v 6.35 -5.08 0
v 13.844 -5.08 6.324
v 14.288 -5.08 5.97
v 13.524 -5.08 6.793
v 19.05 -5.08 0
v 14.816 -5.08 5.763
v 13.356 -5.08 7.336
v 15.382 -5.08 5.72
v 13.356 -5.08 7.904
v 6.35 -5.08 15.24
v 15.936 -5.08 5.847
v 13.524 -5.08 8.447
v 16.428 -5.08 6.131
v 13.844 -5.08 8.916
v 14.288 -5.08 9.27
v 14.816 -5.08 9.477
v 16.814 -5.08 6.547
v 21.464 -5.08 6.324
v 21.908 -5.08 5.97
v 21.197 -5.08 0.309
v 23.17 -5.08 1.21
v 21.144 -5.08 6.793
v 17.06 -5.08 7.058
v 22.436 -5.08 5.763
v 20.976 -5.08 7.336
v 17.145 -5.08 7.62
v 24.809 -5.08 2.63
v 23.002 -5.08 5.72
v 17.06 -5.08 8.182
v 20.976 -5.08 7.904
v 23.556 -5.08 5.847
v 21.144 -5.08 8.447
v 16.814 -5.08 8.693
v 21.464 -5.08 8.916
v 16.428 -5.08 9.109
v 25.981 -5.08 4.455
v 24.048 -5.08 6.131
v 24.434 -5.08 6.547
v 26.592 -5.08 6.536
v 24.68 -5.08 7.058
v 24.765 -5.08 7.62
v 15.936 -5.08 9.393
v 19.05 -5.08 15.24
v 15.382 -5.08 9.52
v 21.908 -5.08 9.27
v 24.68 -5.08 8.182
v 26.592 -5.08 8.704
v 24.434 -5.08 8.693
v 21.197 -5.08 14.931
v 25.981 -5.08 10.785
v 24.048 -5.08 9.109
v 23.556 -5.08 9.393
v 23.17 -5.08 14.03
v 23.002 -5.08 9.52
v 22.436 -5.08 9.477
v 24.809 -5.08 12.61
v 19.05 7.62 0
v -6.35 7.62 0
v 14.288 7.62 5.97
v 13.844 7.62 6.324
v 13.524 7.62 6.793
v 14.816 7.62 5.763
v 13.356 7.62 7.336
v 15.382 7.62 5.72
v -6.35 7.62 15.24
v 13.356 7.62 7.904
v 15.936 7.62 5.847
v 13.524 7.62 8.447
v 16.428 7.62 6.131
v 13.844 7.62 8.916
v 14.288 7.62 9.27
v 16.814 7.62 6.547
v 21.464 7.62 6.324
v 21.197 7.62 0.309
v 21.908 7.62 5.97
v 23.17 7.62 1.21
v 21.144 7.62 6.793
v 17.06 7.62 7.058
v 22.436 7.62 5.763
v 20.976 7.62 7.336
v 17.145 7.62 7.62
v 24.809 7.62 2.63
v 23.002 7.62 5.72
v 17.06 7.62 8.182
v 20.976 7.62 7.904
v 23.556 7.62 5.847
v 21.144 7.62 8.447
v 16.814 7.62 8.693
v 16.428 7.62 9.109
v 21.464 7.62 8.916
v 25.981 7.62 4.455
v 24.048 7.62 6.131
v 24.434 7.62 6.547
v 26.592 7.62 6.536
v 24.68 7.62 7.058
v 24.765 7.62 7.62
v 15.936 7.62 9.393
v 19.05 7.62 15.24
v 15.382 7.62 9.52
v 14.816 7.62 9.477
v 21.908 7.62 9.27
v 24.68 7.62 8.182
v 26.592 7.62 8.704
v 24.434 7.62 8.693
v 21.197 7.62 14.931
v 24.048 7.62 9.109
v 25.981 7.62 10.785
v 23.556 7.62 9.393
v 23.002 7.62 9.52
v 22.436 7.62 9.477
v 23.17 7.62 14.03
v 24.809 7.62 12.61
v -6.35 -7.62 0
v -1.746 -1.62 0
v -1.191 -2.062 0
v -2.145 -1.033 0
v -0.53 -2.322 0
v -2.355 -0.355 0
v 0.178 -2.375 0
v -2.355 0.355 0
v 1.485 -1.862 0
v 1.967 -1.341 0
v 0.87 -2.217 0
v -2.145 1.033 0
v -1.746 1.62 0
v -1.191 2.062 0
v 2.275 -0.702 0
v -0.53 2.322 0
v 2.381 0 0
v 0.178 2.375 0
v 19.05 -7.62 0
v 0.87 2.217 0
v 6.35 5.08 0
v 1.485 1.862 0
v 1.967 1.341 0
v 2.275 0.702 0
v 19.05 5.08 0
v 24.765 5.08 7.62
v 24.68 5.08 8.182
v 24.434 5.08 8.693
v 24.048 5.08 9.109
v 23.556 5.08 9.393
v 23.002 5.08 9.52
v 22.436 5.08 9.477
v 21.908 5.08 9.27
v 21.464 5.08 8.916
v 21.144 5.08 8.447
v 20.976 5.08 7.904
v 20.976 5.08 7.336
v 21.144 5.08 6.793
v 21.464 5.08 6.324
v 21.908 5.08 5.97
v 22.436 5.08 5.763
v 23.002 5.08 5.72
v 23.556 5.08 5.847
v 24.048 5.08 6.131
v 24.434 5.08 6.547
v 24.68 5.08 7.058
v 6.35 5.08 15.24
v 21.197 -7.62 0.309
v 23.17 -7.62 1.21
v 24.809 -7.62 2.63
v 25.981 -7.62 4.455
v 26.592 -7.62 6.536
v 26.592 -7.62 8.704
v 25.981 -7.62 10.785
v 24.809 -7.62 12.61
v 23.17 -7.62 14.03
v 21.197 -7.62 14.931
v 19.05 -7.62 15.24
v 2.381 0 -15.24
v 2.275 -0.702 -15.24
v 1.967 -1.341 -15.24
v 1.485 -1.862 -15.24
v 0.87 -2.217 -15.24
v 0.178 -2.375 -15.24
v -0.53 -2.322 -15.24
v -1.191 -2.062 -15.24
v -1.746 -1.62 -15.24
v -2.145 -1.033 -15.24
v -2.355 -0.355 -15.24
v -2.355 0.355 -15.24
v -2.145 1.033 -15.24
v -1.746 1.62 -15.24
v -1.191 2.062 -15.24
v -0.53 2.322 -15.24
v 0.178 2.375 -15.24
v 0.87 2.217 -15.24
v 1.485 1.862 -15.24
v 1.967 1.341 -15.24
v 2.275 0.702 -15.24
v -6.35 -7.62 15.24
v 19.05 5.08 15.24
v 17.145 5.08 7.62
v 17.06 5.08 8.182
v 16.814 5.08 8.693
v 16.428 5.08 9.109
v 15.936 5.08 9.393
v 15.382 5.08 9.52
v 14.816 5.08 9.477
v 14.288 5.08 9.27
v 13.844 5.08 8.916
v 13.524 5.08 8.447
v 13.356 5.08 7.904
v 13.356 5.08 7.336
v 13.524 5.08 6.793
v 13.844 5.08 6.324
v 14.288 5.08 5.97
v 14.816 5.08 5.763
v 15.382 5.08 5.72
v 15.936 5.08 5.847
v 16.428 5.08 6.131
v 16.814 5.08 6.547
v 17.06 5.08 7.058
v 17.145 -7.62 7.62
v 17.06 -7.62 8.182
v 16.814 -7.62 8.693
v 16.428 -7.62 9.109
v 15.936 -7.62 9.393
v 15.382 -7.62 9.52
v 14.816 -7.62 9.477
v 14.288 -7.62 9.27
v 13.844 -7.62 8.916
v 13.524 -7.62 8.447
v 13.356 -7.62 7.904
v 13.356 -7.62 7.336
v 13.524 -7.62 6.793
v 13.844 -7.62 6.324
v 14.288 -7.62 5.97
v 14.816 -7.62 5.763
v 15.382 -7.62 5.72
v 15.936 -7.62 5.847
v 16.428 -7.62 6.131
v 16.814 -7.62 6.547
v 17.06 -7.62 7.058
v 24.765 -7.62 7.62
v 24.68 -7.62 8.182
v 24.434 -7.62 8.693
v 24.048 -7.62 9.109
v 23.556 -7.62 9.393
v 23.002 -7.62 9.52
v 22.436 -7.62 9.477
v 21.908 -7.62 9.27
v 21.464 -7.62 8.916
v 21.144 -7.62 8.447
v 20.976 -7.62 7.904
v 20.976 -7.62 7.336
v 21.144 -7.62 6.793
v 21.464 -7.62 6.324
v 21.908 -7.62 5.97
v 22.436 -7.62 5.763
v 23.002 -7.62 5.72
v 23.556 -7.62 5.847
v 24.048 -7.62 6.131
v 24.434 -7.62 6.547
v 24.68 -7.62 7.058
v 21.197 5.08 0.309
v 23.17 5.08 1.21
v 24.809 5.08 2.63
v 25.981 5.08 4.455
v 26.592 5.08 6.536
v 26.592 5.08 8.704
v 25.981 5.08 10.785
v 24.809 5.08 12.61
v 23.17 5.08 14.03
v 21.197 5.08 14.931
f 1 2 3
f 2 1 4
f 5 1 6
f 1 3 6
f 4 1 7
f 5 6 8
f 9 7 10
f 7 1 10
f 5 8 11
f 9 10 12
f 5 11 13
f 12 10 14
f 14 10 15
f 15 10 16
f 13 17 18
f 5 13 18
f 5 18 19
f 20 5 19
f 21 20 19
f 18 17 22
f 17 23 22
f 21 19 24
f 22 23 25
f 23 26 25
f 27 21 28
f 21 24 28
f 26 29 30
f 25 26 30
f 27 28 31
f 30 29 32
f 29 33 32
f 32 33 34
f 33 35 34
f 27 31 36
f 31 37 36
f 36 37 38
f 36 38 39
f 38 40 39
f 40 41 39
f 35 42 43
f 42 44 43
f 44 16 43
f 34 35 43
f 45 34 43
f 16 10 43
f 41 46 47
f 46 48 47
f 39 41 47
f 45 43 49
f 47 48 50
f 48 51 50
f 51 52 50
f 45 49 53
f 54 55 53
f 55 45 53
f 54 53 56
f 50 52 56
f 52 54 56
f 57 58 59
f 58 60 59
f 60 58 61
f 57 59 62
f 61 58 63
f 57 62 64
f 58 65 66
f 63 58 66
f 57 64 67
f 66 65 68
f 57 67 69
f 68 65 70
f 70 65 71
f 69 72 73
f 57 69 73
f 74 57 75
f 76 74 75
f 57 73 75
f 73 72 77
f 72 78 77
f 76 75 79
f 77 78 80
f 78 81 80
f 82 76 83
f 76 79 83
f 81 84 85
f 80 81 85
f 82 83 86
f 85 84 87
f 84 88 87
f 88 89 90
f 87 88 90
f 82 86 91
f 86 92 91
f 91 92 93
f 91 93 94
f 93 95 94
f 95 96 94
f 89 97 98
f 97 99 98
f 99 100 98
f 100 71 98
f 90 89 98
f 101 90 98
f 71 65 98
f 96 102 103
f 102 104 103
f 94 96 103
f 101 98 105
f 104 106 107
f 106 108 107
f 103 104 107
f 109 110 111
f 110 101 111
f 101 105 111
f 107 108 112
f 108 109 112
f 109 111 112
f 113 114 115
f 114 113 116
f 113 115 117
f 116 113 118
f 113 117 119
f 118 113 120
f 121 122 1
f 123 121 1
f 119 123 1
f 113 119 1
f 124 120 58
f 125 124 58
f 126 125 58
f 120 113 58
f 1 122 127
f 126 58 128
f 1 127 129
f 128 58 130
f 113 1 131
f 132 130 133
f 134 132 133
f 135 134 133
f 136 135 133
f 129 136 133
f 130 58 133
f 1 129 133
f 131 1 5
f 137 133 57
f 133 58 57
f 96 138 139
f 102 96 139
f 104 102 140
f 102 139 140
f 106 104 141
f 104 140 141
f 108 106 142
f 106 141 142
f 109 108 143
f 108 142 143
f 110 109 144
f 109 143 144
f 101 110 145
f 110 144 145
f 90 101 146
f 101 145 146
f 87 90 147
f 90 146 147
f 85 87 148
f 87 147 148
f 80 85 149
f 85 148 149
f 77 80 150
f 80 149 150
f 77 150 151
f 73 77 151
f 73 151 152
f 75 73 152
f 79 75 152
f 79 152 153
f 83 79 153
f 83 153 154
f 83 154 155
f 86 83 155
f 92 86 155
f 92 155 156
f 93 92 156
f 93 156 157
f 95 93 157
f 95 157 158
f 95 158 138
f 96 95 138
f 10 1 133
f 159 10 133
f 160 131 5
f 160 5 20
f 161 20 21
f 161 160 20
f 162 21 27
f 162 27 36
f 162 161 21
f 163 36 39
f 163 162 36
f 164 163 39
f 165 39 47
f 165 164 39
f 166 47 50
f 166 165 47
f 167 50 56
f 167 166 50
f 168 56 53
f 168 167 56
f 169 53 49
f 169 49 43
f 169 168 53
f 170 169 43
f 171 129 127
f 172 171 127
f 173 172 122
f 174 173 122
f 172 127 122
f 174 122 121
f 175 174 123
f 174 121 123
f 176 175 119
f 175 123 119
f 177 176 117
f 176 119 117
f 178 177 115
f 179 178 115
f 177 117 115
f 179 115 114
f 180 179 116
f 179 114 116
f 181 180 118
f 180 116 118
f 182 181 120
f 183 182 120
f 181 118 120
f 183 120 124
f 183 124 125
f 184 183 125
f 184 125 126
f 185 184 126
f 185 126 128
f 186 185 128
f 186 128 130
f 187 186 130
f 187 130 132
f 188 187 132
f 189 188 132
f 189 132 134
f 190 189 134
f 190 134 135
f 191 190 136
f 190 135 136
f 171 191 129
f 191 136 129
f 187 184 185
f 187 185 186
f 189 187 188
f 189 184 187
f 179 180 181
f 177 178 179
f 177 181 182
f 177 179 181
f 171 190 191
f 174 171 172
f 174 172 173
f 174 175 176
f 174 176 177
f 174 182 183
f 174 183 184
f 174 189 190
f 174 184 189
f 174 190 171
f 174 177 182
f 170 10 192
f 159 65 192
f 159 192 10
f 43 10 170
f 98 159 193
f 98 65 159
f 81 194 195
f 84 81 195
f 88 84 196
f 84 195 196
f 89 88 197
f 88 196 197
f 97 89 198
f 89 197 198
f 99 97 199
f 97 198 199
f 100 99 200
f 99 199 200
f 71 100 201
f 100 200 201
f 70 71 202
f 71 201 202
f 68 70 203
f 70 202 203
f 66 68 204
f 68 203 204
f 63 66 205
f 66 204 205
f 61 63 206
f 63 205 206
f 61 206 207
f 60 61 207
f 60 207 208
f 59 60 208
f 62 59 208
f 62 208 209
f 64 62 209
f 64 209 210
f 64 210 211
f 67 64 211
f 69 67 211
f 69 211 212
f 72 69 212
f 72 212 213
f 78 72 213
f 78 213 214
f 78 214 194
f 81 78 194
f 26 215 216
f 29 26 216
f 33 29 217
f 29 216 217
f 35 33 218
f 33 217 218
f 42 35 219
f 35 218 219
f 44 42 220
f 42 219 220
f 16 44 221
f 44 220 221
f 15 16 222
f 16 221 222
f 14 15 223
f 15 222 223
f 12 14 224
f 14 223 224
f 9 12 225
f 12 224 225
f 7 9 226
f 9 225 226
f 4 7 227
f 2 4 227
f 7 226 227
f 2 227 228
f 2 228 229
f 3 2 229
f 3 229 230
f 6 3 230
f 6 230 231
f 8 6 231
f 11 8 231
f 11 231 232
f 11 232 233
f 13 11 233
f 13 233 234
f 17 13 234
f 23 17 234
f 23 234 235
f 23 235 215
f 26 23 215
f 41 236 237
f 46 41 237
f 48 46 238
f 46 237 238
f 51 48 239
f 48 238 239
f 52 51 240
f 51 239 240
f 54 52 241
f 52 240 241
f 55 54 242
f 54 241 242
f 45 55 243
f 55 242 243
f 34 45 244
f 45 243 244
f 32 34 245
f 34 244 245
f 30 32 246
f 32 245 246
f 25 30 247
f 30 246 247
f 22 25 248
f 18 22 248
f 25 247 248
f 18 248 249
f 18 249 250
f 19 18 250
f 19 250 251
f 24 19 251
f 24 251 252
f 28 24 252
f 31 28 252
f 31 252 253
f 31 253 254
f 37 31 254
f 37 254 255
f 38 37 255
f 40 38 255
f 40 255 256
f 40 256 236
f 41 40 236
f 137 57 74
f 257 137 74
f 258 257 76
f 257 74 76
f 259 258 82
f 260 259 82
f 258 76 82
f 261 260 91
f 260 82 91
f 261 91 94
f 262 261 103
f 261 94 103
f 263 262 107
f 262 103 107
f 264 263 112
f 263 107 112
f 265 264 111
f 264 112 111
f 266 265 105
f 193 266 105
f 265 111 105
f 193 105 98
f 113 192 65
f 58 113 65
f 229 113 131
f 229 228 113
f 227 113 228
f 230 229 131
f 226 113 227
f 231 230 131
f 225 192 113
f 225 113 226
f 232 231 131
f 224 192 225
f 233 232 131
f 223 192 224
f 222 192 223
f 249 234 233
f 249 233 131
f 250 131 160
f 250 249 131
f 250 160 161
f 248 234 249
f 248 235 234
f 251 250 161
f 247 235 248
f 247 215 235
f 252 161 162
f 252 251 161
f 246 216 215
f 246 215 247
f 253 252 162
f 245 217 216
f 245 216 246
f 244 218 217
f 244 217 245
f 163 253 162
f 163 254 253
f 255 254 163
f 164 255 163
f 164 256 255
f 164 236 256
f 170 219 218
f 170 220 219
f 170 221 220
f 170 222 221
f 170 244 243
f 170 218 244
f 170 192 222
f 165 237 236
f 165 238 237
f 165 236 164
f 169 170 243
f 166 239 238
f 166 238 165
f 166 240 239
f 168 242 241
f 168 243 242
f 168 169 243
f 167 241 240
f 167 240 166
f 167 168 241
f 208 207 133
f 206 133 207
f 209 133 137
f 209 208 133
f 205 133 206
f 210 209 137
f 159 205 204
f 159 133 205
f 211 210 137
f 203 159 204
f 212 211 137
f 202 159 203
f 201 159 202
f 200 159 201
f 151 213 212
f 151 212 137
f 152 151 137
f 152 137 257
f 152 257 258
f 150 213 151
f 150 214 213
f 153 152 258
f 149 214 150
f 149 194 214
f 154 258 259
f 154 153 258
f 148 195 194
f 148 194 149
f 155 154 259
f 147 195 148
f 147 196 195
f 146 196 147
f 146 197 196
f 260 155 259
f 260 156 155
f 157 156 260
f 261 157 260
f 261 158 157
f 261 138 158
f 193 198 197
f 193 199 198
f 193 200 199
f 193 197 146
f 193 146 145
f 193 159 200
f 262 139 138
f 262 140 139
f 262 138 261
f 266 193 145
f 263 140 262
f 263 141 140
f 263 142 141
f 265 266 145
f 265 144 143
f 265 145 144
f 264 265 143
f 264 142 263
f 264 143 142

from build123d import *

# Parameters (mm, degrees)
F0_W     = 12.7
F0_H     = 15.24
F1_DEPTH = 15.24
F2_R     = 2.38125
F3_DEPTH = 15.24
F4_W     = 12.7
F4_H     = 15.24
F5_DEPTH = 2.54
F7_R     = 1.905
F8_DEPTH = 15.241


with BuildPart() as f1:
    # F0 (on Top) → F1 (new body)
    with BuildSketch(Plane.XY):
        Rectangle(F0_W, F0_H)
    extrude(amount=F1_DEPTH)

    # F2 (on face) → F3 (join)
    with BuildSketch(Plane(origin=(0, 0, 0), x_dir=(1, 0, 0), z_dir=(0, 0, -1))):
        Circle(F2_R)
    extrude(amount=F3_DEPTH)

    # F4 (on face) → F5 (join)
    with BuildSketch(Plane.XZ.offset(7.62)):
        with Locations((12.7, 7.62)):
            Rectangle(F4_W, F4_H)
        with BuildLine():
            ThreePointArc((19.05, 0), (26.67, 7.62), (19.05, 15.24))
            Line((19.05, 15.24), (19.05, 0))
        make_face()
    extrude(amount=-F5_DEPTH)

    # F6: F1 across plane


with BuildPart() as f1_1:
    add(f1.part)
    add(f1.part.mirror(Plane.XZ))

    # F7 (on face) → F8 (cut, through all)
    with BuildSketch(Plane.XZ.offset(7.62)):
        with Locations((15.24, 7.62)):
            Circle(F7_R)
        with Locations((22.86, 7.62)):
            Circle(F7_R)
    extrude(amount=-F8_DEPTH, mode=Mode.SUBTRACT)


solid = f1_1.part
